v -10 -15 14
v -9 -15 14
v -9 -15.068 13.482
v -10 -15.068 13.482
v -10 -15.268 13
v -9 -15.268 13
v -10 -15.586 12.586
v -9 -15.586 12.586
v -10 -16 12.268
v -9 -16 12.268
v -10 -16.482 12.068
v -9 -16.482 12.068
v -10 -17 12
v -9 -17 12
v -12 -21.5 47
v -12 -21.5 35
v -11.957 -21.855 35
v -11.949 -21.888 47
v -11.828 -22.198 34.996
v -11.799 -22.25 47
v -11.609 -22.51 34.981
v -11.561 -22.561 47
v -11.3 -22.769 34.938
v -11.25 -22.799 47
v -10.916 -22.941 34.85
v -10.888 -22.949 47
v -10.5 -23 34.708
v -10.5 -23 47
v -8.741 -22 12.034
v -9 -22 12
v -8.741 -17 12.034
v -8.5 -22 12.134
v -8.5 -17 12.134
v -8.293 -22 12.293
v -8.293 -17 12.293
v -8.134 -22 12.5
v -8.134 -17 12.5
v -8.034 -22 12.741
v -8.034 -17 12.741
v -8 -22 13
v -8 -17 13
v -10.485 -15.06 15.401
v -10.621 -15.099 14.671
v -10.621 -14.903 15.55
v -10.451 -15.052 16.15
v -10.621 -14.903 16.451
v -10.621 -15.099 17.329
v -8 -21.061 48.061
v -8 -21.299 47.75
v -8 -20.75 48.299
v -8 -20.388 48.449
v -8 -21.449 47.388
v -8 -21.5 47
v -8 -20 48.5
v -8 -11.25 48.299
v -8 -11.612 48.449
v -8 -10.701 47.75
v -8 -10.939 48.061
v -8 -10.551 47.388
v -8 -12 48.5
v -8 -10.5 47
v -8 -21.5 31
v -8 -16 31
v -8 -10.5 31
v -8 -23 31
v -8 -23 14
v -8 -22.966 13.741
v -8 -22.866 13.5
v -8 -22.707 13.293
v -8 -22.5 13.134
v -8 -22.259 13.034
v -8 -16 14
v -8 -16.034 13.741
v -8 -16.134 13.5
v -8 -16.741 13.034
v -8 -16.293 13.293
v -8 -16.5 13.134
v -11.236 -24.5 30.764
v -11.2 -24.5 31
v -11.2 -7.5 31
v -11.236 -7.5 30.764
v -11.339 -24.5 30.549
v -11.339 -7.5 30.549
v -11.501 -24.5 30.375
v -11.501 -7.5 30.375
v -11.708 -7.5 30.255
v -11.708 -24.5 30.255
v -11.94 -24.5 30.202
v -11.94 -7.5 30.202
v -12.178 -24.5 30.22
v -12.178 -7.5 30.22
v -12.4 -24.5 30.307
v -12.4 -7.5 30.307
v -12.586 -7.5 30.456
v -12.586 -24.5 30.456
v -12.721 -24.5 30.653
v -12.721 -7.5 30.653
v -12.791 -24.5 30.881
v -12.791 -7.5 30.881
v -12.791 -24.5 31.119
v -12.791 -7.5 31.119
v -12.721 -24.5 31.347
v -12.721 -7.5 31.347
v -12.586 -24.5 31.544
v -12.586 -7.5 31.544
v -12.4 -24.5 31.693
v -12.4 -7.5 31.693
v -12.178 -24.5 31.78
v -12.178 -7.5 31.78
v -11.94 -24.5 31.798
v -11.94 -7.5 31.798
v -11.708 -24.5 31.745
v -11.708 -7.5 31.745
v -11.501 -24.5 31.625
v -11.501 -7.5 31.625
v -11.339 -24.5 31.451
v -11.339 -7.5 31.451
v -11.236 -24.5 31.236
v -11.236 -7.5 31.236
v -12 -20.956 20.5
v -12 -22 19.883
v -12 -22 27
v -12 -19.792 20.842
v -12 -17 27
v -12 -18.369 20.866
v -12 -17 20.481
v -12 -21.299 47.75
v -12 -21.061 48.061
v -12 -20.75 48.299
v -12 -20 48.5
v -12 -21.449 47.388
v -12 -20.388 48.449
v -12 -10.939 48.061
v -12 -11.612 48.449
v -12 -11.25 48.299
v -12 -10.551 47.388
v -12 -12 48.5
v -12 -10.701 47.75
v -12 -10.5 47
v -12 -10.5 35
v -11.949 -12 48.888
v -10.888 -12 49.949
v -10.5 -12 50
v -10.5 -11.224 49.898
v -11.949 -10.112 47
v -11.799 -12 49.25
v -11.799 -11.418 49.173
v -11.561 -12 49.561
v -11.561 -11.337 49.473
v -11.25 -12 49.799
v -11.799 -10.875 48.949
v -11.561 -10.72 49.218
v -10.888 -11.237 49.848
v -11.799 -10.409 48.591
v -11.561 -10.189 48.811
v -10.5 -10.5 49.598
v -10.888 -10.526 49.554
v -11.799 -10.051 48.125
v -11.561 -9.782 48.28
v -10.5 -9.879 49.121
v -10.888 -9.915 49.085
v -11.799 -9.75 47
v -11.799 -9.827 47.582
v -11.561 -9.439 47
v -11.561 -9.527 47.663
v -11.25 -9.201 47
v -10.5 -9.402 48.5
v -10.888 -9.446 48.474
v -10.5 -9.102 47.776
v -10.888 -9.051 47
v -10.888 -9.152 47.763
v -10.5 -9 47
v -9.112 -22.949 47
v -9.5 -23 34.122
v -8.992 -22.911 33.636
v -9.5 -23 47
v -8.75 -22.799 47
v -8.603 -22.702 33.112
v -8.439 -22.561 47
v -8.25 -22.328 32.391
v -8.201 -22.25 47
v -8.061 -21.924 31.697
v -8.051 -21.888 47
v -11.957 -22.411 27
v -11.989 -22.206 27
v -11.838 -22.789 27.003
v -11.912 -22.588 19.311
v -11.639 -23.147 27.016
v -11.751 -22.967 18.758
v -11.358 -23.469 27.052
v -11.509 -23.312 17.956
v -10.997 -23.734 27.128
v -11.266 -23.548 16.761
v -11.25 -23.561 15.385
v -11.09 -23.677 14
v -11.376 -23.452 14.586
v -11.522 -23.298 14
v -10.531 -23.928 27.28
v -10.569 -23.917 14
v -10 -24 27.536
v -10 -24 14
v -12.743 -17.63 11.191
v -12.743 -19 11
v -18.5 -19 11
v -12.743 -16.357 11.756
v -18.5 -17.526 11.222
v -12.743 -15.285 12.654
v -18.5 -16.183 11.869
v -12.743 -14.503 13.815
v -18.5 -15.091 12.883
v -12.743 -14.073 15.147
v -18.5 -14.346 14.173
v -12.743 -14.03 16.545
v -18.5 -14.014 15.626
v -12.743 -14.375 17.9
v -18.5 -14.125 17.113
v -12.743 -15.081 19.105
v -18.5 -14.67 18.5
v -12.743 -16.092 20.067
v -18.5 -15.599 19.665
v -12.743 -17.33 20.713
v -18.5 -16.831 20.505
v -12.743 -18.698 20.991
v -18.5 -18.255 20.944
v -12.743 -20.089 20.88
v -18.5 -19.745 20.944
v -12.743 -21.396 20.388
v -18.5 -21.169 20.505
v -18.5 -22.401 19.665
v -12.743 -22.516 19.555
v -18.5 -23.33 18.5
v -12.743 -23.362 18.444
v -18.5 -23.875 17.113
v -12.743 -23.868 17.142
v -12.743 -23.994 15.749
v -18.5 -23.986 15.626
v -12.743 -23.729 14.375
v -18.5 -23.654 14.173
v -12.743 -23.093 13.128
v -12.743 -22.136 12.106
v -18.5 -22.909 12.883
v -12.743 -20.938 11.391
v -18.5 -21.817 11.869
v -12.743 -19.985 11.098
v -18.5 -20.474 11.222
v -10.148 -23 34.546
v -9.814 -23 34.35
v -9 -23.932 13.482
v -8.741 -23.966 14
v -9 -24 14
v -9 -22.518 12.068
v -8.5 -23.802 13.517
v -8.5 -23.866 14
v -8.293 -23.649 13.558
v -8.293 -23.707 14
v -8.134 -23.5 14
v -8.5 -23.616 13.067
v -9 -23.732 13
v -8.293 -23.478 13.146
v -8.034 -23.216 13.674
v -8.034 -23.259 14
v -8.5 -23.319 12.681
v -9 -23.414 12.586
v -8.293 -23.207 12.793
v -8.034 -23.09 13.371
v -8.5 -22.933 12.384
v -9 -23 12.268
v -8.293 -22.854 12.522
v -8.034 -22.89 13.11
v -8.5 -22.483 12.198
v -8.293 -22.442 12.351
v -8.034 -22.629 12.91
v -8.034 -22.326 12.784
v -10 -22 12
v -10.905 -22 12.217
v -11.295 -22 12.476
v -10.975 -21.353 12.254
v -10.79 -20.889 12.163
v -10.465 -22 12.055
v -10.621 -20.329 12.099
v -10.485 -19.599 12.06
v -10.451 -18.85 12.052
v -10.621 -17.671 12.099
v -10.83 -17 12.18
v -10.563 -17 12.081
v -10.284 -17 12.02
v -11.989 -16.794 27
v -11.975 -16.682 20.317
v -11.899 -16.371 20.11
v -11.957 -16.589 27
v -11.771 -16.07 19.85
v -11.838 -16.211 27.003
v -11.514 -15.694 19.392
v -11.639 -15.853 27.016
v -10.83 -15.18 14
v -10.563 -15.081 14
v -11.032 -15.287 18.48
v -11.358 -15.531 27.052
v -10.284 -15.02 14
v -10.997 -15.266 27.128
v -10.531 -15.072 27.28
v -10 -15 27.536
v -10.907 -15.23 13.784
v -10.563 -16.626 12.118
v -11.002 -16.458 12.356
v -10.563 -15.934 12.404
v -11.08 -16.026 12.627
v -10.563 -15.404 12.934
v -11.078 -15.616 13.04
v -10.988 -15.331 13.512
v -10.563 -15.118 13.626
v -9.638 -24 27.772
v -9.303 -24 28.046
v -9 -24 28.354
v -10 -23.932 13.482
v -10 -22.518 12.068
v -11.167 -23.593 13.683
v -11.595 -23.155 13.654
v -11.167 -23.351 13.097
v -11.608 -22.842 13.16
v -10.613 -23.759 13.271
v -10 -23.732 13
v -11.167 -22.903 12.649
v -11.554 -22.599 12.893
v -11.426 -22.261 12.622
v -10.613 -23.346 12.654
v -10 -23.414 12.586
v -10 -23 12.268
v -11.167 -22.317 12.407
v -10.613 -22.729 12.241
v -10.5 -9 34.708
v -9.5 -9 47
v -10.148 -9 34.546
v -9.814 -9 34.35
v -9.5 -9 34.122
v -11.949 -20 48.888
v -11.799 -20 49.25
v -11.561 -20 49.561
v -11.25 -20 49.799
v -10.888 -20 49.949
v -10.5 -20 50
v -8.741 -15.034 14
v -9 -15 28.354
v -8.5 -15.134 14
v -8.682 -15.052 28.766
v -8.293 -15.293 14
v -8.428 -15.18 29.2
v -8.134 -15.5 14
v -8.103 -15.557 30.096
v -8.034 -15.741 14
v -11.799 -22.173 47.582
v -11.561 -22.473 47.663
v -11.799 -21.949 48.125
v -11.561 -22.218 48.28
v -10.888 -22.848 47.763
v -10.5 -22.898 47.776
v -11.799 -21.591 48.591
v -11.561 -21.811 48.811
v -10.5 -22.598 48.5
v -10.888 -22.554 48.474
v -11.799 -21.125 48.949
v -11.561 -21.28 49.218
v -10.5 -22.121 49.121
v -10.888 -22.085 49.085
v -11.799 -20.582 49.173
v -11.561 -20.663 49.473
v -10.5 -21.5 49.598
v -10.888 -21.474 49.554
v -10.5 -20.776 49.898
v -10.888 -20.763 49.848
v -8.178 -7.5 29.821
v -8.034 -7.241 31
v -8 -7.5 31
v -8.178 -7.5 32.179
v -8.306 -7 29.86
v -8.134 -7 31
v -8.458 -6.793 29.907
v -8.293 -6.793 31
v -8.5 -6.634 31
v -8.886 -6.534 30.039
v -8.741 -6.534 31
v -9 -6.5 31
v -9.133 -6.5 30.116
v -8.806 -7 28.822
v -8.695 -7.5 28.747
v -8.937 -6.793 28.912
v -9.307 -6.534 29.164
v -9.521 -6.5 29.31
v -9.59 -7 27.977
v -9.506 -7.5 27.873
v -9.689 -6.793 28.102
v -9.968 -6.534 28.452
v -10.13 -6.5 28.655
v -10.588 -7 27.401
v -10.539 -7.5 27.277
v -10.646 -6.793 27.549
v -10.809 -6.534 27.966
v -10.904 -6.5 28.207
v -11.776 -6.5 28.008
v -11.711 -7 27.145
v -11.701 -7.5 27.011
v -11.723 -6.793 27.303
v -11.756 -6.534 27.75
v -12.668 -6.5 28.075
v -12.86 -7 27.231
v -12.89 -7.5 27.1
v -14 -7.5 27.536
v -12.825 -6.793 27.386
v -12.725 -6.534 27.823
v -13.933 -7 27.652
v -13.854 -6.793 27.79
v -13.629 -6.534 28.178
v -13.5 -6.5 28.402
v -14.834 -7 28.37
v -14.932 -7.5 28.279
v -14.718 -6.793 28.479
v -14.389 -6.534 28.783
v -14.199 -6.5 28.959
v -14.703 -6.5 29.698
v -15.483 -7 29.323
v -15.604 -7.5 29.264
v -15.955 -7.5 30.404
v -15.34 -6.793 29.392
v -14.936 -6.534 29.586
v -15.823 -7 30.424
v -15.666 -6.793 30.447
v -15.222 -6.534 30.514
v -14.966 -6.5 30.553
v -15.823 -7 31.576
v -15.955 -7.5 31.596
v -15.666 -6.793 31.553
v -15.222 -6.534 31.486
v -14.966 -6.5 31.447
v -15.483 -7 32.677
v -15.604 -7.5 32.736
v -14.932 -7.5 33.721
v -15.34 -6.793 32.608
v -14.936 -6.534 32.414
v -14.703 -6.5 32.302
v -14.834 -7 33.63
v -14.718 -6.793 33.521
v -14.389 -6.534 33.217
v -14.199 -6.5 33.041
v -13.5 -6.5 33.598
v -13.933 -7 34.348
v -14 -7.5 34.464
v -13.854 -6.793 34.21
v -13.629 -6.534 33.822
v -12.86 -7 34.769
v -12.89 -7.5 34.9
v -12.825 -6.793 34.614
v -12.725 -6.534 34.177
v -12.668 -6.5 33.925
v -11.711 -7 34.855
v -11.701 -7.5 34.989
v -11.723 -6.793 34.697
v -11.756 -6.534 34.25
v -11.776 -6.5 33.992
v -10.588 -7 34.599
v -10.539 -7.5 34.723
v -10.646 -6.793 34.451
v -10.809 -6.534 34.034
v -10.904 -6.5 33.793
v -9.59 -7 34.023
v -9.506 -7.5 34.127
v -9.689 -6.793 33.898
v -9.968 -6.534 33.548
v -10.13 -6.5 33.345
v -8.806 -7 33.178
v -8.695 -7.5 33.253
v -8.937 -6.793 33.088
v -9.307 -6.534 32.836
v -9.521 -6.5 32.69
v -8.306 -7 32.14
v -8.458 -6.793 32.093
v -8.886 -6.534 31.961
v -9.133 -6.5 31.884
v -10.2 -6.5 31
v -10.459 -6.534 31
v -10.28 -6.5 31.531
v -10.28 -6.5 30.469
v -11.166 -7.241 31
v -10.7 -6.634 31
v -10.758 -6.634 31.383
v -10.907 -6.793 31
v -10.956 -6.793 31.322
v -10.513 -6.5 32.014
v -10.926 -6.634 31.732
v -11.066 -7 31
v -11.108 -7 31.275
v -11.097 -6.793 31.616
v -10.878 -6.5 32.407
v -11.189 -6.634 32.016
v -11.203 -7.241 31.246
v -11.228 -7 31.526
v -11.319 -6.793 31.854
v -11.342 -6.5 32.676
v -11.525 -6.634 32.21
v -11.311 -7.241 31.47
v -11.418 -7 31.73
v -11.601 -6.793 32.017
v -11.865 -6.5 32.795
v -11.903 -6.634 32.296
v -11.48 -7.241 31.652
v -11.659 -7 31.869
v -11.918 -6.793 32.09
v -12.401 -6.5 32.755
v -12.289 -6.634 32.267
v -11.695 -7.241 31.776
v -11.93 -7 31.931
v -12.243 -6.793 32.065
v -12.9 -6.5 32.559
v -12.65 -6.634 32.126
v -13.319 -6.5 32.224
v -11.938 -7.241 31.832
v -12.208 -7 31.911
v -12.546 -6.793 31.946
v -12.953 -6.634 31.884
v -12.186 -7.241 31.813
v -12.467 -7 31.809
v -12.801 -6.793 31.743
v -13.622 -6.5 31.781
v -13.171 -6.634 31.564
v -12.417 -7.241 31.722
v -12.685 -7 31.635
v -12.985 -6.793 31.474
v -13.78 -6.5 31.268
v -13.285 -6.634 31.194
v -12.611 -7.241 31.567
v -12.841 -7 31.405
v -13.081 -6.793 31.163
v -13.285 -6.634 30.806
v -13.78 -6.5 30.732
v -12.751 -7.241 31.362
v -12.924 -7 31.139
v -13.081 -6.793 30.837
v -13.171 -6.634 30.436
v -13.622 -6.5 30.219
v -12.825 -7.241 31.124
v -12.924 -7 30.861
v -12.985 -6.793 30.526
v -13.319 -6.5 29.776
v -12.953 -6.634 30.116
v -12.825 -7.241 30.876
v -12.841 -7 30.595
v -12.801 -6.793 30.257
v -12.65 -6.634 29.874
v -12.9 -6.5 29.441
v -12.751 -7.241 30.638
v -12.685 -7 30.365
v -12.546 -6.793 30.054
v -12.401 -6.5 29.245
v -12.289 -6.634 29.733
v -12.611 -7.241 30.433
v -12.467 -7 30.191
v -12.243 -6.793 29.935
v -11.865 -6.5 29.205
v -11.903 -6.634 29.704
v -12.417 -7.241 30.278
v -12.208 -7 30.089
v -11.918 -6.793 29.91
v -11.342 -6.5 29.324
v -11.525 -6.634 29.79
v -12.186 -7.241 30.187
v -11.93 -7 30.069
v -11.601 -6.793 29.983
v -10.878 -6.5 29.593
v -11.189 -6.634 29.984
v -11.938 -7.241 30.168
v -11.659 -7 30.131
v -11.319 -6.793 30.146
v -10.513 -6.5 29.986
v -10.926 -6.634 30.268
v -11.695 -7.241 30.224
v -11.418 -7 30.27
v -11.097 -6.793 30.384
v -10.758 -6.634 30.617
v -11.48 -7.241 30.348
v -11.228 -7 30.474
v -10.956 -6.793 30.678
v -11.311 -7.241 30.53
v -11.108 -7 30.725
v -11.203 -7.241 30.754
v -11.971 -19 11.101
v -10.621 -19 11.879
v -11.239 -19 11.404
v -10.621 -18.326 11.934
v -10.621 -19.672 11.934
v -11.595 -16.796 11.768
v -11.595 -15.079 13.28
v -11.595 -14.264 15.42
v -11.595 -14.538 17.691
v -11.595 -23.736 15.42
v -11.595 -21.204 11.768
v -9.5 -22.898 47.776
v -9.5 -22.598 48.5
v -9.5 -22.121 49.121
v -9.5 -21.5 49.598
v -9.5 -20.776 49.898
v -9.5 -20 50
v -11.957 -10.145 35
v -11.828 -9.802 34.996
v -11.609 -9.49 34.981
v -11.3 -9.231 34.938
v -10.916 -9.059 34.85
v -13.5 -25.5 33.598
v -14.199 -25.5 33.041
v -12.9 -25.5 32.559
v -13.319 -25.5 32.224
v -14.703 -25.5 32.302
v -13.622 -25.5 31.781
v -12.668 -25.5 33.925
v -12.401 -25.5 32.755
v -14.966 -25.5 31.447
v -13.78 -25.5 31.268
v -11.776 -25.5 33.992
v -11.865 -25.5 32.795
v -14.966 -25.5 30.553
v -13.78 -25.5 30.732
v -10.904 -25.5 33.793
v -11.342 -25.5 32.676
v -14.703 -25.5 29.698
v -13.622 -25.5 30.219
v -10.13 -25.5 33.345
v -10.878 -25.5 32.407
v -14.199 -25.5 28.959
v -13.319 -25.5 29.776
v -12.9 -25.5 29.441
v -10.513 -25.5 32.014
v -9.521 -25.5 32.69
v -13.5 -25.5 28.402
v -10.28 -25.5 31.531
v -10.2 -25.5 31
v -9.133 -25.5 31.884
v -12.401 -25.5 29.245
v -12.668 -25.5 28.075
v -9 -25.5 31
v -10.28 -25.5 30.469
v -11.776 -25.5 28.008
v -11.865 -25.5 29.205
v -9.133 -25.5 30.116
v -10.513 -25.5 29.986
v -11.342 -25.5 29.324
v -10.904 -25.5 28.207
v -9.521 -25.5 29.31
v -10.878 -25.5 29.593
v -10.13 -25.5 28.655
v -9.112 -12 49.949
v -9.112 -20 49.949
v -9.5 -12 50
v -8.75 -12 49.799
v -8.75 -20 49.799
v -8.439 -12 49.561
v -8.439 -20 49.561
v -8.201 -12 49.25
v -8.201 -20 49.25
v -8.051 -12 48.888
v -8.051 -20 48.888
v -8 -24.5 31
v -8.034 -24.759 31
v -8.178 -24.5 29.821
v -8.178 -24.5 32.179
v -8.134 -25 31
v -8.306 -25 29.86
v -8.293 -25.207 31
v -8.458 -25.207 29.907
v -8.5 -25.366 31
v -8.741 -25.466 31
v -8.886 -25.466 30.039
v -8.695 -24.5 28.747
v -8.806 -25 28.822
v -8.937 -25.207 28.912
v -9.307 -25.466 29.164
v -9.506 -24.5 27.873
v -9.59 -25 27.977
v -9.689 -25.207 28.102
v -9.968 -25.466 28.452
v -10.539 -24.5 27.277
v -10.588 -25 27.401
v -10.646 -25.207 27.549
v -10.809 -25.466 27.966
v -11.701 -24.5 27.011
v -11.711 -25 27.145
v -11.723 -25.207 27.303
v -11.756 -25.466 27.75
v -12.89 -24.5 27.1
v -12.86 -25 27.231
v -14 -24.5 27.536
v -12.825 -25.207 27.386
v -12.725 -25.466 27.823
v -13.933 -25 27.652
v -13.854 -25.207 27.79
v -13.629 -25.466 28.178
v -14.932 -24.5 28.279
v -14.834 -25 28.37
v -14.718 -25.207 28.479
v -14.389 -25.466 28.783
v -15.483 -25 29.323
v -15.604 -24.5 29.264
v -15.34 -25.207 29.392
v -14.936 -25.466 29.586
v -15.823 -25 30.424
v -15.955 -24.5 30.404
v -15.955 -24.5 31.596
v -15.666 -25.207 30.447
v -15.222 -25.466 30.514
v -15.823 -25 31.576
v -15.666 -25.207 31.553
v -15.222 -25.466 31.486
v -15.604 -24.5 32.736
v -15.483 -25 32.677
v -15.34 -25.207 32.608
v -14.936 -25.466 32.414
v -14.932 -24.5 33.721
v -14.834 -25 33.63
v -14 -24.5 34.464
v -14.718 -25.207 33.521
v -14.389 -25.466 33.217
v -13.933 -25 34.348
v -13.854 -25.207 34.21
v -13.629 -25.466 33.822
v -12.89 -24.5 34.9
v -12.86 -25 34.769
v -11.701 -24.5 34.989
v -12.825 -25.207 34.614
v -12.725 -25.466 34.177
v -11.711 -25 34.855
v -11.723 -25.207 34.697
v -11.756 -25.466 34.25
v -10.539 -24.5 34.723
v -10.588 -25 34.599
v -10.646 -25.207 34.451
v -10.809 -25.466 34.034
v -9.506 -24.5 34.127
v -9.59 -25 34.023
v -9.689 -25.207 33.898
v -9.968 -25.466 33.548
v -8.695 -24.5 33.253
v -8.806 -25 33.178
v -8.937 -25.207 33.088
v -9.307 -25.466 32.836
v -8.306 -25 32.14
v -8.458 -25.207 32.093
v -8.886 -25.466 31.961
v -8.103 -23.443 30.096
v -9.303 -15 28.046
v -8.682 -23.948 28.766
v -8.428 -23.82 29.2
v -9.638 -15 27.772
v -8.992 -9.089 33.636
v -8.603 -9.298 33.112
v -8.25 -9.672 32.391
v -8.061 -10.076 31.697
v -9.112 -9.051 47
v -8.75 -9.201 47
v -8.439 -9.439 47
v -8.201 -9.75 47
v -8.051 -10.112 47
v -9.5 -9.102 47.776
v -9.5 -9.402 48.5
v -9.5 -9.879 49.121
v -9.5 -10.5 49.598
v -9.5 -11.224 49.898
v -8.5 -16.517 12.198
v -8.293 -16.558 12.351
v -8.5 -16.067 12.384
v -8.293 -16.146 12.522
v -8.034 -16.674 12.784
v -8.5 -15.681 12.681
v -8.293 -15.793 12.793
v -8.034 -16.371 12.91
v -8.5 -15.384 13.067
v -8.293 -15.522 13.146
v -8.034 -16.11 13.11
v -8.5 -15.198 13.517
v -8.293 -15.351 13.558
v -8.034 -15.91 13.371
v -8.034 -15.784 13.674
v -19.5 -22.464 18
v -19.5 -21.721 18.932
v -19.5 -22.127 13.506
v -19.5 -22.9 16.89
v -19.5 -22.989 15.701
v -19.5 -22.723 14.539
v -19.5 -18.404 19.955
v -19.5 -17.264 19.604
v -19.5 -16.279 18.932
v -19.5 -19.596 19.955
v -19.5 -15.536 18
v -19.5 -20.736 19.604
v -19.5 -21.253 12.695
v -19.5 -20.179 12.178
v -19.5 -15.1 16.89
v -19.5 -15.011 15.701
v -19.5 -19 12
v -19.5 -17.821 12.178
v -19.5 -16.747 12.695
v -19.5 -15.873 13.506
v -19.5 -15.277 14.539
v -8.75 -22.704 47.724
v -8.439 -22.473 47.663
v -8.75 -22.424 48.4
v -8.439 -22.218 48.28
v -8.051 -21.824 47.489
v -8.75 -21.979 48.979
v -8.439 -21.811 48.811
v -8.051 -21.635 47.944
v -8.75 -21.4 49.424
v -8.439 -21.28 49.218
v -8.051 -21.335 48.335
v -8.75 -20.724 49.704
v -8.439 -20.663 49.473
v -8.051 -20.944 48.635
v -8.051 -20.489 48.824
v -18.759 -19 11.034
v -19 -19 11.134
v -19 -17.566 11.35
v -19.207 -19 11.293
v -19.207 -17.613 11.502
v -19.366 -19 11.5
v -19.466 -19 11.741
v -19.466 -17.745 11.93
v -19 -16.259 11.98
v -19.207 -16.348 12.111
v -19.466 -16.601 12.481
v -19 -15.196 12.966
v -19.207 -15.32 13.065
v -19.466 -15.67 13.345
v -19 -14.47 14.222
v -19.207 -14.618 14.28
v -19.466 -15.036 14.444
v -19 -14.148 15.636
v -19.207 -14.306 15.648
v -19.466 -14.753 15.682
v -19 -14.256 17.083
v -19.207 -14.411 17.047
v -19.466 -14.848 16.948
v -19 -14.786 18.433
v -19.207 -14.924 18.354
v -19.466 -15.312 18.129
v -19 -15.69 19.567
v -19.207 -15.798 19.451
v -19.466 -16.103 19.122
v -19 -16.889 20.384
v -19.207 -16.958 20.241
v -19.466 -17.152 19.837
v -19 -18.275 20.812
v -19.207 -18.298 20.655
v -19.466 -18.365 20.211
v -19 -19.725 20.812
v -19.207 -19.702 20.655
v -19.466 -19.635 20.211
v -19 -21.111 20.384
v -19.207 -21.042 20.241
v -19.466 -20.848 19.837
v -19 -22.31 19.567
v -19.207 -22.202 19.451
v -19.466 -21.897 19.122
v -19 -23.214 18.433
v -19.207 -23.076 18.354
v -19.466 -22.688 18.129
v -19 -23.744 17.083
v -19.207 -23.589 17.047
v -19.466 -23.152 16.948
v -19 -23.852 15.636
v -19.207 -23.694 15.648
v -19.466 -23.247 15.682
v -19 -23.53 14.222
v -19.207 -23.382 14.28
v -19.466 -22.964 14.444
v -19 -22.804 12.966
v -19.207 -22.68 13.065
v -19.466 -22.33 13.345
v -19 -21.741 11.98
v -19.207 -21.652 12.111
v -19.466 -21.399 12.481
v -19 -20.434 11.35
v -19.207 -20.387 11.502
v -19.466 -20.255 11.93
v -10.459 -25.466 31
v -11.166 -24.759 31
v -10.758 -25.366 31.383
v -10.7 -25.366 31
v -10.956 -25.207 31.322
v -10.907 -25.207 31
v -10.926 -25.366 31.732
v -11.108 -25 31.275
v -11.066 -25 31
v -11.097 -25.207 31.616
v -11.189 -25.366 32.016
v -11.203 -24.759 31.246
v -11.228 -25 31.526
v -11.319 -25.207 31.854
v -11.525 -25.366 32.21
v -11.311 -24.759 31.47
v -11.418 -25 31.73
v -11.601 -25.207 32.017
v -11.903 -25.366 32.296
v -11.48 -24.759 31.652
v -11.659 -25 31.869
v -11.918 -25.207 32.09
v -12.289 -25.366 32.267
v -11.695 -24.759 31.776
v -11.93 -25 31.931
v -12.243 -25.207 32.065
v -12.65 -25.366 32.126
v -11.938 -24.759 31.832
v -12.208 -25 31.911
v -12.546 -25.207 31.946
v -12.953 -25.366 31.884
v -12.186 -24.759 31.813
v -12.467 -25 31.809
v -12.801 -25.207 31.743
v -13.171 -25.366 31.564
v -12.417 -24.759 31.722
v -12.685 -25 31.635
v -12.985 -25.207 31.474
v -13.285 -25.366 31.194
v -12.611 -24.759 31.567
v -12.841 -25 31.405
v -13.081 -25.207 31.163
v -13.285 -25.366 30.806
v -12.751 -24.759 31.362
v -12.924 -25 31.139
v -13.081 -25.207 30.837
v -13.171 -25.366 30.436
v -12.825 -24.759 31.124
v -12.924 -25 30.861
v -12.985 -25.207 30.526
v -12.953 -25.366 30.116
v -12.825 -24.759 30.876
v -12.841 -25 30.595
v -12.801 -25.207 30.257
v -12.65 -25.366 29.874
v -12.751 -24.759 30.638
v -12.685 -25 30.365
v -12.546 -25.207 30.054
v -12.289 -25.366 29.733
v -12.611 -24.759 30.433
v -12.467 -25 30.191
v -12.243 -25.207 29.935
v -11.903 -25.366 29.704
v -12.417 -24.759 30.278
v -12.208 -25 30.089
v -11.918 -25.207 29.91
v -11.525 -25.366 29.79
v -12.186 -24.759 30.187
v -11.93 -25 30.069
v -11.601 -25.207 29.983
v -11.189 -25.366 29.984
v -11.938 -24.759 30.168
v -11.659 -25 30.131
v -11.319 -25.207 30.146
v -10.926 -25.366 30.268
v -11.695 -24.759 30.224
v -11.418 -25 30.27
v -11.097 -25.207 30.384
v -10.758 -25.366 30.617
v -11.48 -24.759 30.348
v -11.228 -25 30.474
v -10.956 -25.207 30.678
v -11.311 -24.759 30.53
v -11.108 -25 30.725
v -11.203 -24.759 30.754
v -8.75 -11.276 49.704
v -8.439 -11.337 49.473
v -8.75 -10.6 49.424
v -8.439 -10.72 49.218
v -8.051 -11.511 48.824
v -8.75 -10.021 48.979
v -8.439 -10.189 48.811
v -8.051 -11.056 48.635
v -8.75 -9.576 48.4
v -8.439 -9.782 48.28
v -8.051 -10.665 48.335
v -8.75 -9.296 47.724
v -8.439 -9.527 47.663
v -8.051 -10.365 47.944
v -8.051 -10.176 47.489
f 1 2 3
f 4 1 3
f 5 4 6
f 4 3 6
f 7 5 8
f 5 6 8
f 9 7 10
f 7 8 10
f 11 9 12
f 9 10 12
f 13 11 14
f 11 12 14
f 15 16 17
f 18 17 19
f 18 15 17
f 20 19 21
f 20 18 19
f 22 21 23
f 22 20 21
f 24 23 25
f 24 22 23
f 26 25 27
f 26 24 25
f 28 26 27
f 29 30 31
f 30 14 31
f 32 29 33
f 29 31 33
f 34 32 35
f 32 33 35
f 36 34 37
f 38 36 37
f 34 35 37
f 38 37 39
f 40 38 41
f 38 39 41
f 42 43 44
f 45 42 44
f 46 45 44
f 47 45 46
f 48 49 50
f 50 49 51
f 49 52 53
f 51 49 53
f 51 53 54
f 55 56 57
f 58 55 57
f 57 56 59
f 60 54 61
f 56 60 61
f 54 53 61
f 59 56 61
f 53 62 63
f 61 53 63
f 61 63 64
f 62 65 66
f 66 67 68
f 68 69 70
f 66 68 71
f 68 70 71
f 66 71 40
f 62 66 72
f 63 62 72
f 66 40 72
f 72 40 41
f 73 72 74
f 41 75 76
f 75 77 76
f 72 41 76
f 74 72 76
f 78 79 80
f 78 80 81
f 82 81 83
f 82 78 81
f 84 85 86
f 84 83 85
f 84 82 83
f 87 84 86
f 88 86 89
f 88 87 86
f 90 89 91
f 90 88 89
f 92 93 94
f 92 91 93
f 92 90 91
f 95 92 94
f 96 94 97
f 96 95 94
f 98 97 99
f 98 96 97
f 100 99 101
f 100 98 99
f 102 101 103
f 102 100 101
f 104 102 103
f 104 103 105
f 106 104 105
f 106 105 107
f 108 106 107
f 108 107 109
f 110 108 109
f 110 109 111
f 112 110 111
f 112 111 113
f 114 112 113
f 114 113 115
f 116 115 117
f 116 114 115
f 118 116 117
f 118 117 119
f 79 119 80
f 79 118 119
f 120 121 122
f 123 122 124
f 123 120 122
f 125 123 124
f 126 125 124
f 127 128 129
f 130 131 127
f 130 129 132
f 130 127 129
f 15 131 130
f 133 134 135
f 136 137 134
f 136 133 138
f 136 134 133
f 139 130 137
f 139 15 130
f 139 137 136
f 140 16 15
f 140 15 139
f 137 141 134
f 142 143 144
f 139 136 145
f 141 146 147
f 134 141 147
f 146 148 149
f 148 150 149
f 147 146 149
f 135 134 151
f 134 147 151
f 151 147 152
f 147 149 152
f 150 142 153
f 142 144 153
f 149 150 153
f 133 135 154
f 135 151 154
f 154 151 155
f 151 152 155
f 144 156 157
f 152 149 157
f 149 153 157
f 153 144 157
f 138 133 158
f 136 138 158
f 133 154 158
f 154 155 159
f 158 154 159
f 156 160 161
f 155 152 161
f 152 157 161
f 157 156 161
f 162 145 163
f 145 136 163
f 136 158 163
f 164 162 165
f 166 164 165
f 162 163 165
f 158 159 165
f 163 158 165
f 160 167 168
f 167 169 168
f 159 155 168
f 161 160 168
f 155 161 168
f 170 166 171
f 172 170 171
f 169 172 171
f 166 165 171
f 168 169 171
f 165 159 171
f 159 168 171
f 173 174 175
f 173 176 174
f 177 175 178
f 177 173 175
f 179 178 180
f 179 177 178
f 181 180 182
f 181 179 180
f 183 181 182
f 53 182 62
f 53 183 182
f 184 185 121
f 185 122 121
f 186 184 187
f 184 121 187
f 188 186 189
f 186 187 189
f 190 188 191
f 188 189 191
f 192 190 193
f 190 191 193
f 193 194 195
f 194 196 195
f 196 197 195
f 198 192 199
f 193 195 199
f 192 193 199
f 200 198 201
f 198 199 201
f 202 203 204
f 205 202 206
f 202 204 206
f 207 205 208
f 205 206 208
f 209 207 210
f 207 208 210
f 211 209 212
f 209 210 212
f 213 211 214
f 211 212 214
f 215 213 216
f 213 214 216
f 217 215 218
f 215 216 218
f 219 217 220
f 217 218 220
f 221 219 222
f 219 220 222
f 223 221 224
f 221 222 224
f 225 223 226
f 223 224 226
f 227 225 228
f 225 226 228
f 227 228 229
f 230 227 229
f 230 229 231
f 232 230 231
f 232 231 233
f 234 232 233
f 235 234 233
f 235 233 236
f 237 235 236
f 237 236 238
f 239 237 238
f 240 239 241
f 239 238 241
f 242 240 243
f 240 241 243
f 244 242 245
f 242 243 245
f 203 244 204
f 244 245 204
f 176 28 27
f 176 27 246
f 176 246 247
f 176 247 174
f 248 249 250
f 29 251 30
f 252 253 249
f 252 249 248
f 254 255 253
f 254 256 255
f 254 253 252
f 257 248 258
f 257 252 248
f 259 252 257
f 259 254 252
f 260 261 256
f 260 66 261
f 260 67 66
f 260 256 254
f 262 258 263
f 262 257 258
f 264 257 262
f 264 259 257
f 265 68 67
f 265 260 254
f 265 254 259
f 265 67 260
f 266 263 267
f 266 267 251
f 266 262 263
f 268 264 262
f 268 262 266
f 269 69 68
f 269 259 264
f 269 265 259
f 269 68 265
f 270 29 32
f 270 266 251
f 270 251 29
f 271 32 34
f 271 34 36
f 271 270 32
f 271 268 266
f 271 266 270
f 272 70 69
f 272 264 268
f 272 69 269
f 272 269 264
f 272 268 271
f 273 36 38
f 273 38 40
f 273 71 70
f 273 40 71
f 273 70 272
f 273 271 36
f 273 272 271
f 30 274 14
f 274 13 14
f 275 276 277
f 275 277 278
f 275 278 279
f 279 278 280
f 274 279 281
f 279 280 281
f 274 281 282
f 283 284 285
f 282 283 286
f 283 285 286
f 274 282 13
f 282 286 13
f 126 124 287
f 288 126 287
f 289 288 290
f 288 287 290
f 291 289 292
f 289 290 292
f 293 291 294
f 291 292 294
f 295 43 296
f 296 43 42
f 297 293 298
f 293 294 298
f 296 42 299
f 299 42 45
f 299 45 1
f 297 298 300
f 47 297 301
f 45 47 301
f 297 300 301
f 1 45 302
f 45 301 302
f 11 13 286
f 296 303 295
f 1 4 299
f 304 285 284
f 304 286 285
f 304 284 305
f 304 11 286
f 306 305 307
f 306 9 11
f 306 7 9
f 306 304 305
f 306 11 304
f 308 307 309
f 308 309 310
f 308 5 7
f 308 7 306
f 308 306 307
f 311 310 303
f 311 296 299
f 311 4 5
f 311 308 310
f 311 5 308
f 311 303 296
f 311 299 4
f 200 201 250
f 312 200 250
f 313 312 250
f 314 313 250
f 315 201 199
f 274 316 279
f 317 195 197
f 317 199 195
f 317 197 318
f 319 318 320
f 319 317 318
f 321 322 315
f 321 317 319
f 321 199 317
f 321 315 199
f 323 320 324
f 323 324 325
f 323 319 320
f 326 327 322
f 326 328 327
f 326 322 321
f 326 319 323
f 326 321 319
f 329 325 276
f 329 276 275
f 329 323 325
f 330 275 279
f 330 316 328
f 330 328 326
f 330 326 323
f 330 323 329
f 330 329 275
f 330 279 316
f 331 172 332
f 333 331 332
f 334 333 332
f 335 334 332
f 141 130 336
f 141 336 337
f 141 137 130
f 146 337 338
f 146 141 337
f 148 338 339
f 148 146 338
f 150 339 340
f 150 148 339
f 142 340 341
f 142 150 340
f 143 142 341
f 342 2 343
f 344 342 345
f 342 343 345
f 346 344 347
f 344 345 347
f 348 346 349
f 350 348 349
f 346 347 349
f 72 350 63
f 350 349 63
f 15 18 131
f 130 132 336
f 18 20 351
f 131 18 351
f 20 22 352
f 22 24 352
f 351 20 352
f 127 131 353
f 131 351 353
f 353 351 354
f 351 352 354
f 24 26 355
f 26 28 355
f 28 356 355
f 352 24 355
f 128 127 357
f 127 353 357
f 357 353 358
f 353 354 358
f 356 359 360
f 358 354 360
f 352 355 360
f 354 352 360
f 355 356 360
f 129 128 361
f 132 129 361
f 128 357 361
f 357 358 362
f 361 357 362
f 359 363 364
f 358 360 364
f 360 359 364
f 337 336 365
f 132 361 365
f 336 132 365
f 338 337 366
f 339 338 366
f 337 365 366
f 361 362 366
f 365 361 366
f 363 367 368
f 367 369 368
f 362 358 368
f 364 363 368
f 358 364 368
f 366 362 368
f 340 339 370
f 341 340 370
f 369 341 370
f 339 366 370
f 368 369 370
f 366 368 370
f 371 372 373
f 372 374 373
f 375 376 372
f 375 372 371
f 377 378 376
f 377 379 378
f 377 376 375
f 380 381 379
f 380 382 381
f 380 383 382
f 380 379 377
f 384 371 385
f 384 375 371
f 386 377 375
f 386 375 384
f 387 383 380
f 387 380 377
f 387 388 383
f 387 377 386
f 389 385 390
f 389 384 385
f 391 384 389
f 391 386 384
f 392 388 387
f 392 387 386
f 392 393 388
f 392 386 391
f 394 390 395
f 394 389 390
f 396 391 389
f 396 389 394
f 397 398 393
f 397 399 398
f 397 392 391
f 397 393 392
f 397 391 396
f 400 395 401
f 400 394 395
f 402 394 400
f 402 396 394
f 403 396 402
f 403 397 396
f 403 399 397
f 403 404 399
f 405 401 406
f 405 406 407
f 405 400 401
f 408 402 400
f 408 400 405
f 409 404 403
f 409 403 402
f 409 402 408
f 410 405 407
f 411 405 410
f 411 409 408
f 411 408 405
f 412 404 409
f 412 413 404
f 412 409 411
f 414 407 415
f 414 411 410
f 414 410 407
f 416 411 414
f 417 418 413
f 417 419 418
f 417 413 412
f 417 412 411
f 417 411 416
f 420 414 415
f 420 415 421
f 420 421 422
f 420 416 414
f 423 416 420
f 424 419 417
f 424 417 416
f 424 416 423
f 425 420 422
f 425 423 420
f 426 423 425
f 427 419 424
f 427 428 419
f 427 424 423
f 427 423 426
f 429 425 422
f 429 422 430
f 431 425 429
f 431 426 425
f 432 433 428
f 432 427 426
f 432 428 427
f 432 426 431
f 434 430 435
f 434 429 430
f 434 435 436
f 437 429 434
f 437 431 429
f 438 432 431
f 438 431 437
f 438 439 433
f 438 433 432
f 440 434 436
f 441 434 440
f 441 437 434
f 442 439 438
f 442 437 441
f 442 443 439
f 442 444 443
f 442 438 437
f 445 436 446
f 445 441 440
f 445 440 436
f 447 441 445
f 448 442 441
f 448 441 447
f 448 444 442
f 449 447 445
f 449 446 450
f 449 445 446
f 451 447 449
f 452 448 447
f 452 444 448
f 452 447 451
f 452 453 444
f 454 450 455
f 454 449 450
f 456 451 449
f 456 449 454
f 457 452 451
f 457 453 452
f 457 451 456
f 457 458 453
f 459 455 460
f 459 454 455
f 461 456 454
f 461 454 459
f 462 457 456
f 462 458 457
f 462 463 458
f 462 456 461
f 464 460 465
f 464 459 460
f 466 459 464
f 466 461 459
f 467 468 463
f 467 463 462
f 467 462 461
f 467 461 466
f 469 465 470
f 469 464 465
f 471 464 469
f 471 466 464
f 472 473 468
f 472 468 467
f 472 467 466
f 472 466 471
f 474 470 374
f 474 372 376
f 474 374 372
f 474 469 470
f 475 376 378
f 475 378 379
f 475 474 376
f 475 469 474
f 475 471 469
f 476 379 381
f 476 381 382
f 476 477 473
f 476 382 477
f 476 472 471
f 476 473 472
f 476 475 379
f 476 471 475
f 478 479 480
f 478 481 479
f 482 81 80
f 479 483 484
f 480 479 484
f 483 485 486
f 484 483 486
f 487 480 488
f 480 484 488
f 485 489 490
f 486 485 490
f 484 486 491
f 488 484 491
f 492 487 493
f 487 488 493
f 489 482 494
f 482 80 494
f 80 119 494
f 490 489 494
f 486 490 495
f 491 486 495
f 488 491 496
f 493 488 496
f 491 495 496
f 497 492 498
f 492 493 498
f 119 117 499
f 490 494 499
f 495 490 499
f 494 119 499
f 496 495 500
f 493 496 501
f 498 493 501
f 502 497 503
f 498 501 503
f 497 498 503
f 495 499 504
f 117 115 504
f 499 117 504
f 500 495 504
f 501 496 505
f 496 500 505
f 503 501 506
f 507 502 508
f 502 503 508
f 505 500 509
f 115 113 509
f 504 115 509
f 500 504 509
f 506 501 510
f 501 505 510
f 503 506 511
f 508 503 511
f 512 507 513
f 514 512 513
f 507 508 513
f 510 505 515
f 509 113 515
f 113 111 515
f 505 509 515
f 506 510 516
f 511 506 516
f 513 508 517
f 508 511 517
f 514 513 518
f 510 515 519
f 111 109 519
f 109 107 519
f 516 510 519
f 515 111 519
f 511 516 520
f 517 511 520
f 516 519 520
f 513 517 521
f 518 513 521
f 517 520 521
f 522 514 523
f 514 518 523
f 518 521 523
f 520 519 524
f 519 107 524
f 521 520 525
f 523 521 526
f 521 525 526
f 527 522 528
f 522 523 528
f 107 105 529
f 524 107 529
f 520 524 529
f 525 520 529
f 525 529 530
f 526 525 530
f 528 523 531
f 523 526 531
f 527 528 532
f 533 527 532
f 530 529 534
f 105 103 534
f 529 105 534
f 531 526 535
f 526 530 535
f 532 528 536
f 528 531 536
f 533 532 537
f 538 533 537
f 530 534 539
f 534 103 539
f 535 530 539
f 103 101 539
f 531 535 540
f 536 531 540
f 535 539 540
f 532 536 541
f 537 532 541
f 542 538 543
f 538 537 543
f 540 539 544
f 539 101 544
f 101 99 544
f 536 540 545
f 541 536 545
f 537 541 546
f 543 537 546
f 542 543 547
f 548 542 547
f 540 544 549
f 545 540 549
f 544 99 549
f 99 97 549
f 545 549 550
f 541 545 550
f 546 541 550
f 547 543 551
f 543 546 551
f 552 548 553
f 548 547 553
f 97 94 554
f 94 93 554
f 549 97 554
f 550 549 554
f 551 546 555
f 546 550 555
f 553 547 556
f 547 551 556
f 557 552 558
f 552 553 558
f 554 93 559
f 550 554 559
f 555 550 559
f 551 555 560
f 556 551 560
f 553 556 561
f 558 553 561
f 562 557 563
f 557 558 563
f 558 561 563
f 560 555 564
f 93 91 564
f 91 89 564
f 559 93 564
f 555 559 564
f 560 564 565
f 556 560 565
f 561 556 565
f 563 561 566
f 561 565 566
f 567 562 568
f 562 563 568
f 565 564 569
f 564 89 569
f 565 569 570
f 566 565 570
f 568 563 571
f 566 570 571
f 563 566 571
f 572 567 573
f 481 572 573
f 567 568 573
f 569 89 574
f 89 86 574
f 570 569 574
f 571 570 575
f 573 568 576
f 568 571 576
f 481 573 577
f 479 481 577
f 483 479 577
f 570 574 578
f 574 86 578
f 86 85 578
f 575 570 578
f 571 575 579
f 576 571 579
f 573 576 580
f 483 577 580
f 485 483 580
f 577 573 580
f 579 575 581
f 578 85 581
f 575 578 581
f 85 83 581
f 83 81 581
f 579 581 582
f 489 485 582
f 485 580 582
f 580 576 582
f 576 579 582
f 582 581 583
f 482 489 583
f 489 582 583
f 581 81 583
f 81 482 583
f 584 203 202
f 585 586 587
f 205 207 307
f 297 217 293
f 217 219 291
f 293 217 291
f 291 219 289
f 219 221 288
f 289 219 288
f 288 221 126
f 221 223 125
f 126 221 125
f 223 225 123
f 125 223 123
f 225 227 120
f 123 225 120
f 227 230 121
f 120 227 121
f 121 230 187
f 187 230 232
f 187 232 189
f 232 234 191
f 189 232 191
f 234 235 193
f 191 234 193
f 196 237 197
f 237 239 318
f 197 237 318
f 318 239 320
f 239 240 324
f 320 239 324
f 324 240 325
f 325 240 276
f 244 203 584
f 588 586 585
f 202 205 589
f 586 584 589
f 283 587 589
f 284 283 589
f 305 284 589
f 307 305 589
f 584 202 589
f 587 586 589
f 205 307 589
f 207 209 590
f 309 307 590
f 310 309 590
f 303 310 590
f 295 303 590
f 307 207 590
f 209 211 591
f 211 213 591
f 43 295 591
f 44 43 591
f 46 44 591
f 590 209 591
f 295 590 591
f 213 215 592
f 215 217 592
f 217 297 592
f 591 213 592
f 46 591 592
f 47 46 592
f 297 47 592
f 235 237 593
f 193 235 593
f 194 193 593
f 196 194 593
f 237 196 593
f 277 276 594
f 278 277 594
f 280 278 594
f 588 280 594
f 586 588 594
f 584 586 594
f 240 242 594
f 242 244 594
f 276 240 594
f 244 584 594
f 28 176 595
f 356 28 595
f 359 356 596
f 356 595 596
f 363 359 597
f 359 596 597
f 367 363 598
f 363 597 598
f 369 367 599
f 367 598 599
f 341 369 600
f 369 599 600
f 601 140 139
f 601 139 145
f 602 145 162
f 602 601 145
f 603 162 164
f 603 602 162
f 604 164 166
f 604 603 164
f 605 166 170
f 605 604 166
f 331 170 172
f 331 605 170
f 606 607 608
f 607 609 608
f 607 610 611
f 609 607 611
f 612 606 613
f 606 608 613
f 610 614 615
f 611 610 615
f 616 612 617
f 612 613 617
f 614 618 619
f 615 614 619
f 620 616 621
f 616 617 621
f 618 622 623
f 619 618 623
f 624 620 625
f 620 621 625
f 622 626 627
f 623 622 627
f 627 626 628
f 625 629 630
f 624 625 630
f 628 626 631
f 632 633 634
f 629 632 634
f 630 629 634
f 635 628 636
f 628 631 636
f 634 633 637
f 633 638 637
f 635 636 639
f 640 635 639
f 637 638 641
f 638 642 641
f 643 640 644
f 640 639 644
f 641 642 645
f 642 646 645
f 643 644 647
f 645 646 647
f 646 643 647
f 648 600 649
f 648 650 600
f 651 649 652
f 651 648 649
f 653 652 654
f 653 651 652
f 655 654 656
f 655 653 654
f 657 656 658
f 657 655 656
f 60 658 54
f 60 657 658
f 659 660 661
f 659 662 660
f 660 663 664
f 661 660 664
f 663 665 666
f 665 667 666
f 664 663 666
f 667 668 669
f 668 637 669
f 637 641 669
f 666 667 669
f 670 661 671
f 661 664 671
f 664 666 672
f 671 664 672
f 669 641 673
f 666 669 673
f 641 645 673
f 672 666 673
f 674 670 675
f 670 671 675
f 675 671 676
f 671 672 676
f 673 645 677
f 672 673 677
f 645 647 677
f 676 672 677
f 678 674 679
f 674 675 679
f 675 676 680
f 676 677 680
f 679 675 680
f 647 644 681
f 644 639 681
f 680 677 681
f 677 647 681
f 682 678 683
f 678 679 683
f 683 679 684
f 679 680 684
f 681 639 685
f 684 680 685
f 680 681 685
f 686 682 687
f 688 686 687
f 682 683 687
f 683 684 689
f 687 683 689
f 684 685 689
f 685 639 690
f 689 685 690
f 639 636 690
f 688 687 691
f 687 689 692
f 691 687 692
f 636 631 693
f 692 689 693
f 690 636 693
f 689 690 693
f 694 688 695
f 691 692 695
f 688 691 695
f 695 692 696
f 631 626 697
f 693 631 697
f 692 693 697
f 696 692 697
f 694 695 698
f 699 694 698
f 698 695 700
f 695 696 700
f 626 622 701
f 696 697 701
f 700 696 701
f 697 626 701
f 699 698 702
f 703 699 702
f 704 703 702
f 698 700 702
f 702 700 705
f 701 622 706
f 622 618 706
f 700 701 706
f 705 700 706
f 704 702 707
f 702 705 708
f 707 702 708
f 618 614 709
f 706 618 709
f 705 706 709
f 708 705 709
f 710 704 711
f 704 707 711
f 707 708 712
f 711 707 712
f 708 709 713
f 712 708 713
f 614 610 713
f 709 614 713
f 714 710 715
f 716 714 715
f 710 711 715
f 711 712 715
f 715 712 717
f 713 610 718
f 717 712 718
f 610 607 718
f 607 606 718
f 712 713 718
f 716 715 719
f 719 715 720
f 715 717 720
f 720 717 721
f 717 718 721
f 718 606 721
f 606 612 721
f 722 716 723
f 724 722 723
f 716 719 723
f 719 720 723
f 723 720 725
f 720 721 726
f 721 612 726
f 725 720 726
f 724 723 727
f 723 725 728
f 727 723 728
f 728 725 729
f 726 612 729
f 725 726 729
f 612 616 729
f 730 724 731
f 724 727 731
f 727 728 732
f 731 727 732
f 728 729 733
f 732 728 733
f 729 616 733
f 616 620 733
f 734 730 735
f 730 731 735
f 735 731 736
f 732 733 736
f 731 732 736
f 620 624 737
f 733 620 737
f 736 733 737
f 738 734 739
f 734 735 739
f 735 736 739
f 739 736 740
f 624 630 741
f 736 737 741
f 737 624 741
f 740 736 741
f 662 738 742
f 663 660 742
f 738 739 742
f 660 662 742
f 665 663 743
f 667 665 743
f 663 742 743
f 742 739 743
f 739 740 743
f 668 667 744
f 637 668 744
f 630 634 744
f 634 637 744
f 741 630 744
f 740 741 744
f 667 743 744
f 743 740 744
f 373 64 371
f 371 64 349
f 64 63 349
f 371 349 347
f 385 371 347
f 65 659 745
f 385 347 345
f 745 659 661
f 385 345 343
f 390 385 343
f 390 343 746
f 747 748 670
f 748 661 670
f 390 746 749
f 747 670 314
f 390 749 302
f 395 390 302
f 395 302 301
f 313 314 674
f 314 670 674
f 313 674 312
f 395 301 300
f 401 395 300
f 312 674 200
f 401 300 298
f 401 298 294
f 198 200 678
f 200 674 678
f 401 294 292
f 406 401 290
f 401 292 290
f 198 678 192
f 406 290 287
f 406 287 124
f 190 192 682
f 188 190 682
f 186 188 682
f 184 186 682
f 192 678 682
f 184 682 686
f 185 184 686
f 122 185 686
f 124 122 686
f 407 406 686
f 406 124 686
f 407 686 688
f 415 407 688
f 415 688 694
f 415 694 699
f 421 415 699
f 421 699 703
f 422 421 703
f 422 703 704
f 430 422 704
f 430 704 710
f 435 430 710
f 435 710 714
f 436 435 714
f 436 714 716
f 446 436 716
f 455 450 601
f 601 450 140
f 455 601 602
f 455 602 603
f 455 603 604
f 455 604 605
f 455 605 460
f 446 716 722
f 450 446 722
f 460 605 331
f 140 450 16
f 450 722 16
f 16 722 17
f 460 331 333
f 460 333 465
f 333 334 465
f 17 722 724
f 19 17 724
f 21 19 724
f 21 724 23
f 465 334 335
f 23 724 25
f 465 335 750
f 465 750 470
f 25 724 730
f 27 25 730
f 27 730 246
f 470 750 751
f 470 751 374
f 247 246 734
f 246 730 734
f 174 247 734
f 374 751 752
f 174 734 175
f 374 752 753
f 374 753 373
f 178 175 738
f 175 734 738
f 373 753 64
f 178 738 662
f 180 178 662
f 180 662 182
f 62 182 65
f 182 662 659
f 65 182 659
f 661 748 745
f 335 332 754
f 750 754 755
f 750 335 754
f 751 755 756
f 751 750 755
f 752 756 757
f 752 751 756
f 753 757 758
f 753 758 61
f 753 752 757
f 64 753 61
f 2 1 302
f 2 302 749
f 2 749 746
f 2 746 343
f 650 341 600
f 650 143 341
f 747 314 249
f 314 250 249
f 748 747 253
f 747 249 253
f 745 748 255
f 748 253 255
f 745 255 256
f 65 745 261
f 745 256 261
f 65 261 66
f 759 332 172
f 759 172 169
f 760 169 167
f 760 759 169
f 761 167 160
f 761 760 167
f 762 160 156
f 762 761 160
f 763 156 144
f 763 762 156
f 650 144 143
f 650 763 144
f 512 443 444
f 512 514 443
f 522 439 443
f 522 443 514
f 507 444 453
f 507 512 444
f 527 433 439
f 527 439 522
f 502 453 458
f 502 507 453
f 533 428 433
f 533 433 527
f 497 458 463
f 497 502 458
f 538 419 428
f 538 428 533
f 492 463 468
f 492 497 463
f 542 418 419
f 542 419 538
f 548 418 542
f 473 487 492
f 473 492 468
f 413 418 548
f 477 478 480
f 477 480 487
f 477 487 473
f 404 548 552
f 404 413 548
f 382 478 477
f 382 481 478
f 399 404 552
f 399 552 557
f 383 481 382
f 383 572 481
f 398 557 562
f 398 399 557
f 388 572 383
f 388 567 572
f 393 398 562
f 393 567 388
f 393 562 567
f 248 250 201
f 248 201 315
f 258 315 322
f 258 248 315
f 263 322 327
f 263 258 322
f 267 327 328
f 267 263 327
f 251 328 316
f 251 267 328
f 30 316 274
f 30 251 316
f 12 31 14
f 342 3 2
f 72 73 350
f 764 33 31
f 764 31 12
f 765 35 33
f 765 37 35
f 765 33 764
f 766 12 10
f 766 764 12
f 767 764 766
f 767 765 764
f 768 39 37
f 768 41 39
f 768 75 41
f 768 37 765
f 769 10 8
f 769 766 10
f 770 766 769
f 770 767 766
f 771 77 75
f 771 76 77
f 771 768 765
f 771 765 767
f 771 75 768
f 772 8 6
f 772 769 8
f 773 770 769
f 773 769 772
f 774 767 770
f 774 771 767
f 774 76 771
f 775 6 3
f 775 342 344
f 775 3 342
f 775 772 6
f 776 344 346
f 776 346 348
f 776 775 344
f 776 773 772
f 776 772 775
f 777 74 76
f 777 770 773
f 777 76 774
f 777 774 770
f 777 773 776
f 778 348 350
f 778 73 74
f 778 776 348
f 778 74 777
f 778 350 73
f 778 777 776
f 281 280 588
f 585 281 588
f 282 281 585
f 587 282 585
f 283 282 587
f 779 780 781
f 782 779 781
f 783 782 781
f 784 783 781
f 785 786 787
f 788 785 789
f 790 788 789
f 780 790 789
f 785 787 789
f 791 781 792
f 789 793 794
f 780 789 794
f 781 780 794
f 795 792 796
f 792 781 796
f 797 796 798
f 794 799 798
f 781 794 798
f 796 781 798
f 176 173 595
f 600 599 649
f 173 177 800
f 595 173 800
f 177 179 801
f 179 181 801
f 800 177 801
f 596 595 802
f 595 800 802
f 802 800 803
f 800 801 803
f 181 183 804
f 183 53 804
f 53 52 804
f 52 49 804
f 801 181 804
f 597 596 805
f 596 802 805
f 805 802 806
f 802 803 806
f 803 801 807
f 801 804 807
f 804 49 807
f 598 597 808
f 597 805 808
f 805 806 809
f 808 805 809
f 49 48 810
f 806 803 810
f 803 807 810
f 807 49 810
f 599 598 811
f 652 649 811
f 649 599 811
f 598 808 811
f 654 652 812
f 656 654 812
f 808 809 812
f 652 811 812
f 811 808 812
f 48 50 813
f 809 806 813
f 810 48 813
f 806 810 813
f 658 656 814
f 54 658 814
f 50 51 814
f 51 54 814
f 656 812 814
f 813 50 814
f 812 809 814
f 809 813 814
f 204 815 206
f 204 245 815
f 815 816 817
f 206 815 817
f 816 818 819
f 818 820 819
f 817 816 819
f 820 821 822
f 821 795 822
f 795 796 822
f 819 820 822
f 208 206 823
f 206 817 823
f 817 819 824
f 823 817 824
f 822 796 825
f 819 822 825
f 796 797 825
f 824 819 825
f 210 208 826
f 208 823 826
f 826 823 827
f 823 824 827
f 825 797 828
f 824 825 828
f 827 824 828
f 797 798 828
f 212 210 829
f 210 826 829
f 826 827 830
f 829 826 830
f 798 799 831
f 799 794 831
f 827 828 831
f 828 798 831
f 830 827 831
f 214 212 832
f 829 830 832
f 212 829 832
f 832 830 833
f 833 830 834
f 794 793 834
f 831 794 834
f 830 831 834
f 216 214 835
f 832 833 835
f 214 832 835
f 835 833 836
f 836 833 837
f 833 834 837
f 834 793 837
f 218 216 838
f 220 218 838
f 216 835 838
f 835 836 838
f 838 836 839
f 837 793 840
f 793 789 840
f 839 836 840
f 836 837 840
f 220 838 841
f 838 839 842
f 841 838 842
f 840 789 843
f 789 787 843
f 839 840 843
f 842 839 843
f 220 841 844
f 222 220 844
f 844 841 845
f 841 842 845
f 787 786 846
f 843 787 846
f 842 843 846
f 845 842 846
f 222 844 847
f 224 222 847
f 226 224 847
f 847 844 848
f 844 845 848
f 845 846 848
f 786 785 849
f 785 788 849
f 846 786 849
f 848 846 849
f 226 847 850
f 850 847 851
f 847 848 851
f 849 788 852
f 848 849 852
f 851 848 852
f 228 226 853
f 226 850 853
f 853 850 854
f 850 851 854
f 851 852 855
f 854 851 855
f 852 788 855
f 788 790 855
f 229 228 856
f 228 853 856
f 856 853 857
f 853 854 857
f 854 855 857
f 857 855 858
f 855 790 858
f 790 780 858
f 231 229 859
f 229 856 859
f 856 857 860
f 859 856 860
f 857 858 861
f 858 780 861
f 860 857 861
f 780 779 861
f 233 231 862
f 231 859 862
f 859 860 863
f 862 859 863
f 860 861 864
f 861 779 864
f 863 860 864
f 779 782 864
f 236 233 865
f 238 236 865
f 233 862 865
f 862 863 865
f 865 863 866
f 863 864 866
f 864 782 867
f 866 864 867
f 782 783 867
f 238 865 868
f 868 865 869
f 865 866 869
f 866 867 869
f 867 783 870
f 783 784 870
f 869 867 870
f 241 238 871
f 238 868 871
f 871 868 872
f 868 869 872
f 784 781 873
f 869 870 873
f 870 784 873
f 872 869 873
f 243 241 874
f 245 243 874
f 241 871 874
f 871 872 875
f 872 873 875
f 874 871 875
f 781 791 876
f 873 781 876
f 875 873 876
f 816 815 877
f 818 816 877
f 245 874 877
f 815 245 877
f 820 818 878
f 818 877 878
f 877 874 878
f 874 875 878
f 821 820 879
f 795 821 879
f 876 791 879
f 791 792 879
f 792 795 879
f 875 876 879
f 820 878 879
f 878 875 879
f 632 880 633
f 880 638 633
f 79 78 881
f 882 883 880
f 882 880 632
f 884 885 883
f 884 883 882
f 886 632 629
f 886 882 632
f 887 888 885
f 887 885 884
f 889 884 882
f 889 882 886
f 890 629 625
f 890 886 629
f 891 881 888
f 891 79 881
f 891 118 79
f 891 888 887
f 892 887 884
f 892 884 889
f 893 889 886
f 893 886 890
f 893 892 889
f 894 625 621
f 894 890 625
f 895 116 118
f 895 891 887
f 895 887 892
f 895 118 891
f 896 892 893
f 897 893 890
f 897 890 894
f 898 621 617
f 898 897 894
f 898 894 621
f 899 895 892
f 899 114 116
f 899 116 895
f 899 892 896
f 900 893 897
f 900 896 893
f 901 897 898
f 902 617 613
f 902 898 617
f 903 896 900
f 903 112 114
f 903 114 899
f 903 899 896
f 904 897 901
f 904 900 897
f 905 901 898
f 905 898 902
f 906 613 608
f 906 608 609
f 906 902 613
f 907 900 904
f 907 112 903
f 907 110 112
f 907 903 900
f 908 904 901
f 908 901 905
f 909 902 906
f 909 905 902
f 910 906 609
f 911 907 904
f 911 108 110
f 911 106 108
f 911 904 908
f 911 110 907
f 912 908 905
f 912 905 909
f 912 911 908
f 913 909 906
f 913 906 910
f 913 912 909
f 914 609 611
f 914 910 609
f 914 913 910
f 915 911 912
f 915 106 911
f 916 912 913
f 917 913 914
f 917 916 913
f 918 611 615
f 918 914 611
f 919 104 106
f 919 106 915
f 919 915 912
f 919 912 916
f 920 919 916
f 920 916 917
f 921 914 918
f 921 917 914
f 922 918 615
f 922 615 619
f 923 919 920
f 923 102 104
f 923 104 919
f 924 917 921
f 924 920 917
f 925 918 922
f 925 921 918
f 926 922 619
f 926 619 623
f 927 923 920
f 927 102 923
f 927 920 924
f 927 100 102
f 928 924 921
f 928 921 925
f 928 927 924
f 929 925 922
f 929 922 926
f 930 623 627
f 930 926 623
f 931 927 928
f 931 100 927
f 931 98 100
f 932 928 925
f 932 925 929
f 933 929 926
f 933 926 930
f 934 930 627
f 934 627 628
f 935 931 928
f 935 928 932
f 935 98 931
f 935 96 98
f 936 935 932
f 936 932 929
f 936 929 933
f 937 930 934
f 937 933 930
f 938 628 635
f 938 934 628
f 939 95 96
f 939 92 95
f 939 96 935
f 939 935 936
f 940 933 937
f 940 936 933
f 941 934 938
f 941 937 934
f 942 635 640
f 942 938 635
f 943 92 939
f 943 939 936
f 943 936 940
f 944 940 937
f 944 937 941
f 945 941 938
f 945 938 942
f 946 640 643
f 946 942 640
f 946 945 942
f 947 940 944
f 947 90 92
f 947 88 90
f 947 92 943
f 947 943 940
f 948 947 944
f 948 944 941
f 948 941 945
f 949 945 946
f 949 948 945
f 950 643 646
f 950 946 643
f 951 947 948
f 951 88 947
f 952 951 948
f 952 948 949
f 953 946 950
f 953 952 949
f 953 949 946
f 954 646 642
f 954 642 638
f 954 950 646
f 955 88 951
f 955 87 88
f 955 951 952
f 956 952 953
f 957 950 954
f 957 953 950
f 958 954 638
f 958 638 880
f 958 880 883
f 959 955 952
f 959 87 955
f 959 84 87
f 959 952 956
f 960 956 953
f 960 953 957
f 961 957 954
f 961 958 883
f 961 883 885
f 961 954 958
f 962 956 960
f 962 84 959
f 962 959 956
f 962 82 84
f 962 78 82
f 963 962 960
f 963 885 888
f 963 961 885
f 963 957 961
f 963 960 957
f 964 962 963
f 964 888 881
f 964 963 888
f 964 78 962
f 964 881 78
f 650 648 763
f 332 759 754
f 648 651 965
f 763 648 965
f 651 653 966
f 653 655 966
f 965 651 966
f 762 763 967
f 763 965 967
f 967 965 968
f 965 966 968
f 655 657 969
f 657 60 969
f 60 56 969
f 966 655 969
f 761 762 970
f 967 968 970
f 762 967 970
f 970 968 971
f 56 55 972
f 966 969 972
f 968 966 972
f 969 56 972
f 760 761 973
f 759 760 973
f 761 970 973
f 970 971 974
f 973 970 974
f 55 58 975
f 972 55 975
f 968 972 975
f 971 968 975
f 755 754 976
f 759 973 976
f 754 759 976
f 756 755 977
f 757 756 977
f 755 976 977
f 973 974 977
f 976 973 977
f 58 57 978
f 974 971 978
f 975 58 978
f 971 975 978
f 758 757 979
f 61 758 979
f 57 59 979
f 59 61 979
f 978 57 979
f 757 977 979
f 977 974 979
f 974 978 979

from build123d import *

# Parameters (mm, degrees)
CYLINDER015_R     = 5
CYLINDER015_DEPTH = 10
FILLET022_R       = 1
CHAMFER_SIZE      = 2
FILLET023_R       = 3
CYLINDER010_R     = 0.8
CYLINDER010_DEPTH = 20
CYLINDER009_R     = 4
CYLINDER009_DEPTH = 19
BOX003_W          = 4
BOX003_H          = 9
BOX003_DEPTH      = 19
FILLET_R          = 2
FILLET001_R       = 2
FILLET002_R       = 1
BOX004_W          = 4
BOX004_H          = 14
BOX004_DEPTH      = 19
FILLET003_R       = 3
FILLET004_R       = 1.5
FILLET005_R       = 1.5
FILLET006_R       = 1


with BuildPart() as fillet023:
    # Cylinder015 → Cylinder015 (new body)
    with BuildSketch(Plane(origin=(-19.5, -19, 16), x_dir=(0, 0, -1), z_dir=(1, 0, 0))):
        Circle(CYLINDER015_R)
    extrude(amount=CYLINDER015_DEPTH)

    # Fillet022
    fillet022_edges = [fillet023.edges().sort_by_distance(p)[0] for p in [
        (-19.5, -19, 21),
    ]]
    fillet(fillet022_edges, radius=FILLET022_R)

    # Chamfer
    chamfer_edges = [fillet023.edges().sort_by_distance(p)[0] for p in [
        (-9.5, -19, 21),
    ]]
    chamfer(chamfer_edges, length=CHAMFER_SIZE)

    # Fillet023
    fillet023_edges = [fillet023.edges().sort_by_distance(p)[0] for p in [
        (-11.5, -19, 21),
    ]]
    fillet(fillet023_edges, radius=FILLET023_R)


with BuildPart() as cylinder010:
    # Cylinder010 → Cylinder010 (new body)
    with BuildSketch(Plane(origin=(-12, -26, 31), x_dir=(1, 0, 0), z_dir=(0, 1, 0))):
        Circle(CYLINDER010_R)
    extrude(amount=CYLINDER010_DEPTH)


with BuildPart() as cylinder009:
    # Cylinder009 → Cylinder009 (new body)
    with BuildSketch(Plane(origin=(-12, -25.5, 31), x_dir=(1, 0, 0), z_dir=(0, 1, 0))):
        Circle(CYLINDER009_R)
    extrude(amount=CYLINDER009_DEPTH)


with BuildPart() as fillet002:
    # Box003 → Box003 (new body)
    with BuildSketch(Plane(origin=(-12, -24, 12), x_dir=(1, 0, 0), z_dir=(0, 0, 1))):
        with Locations((2, 4.5)):
            Rectangle(BOX003_W, BOX003_H)
    extrude(amount=BOX003_DEPTH)

    # Fillet
    fillet_edges = [fillet002.edges().sort_by_distance(p)[0] for p in [
        (-10, -24, 12),
        (-10, -15, 12),
    ]]
    fillet(fillet_edges, radius=FILLET_R)

    # Fillet001
    fillet001_edges = [fillet002.edges().sort_by_distance(p)[0] for p in [
        (-12, -15, 22.5),
    ]]
    fillet(fillet001_edges, radius=FILLET001_R)

    # Fillet002
    fillet002_edges = [fillet002.edges().sort_by_distance(p)[0] for p in [
        (-8, -15, 22.5),
    ]]
    fillet(fillet002_edges, radius=FILLET002_R)


with BuildPart() as pushbutton:
    # Box004 → Box004 (new body)
    with BuildSketch(Plane(origin=(-12, -23, 31), x_dir=(1, 0, 0), z_dir=(0, 0, 1))):
        with Locations((2, 7)):
            Rectangle(BOX004_W, BOX004_H)
    extrude(amount=BOX004_DEPTH)

    # Fillet003
    fillet003_edges = [pushbutton.edges().sort_by_distance(p)[0] for p in [
        (-10, -23, 50),
        (-10, -9, 50),
    ]]
    fillet(fillet003_edges, radius=FILLET003_R)

    # Fillet004
    fillet004_edges = [pushbutton.edges().sort_by_distance(p)[0] for p in [
        (-12, -23, 39),
    ]]
    fillet(fillet004_edges, radius=FILLET004_R)

    # Fillet005
    fillet005_edges = [pushbutton.edges().sort_by_distance(p)[0] for p in [
        (-8, -23, 39),
    ]]
    fillet(fillet005_edges, radius=FILLET005_R)

    # Fusion002: union Cylinder009, Fillet002
    add(cylinder009.part)
    add(fillet002.part)

    # Cut: cut Cylinder010
    add(cylinder010.part, mode=Mode.SUBTRACT)

    # Fillet006
    fillet006_edges = [pushbutton.edges().sort_by_distance(p)[0] for p in [
        (-16, -25.5, 31),
        (-16, -6.5, 31),
        (-12.8, -25.5, 31),
        (-12.8, -6.5, 31),
    ]]
    fillet(fillet006_edges, radius=FILLET006_R)

    # Fusion007: union Fillet023
    add(fillet023.part)


solid = pushbutton.part
